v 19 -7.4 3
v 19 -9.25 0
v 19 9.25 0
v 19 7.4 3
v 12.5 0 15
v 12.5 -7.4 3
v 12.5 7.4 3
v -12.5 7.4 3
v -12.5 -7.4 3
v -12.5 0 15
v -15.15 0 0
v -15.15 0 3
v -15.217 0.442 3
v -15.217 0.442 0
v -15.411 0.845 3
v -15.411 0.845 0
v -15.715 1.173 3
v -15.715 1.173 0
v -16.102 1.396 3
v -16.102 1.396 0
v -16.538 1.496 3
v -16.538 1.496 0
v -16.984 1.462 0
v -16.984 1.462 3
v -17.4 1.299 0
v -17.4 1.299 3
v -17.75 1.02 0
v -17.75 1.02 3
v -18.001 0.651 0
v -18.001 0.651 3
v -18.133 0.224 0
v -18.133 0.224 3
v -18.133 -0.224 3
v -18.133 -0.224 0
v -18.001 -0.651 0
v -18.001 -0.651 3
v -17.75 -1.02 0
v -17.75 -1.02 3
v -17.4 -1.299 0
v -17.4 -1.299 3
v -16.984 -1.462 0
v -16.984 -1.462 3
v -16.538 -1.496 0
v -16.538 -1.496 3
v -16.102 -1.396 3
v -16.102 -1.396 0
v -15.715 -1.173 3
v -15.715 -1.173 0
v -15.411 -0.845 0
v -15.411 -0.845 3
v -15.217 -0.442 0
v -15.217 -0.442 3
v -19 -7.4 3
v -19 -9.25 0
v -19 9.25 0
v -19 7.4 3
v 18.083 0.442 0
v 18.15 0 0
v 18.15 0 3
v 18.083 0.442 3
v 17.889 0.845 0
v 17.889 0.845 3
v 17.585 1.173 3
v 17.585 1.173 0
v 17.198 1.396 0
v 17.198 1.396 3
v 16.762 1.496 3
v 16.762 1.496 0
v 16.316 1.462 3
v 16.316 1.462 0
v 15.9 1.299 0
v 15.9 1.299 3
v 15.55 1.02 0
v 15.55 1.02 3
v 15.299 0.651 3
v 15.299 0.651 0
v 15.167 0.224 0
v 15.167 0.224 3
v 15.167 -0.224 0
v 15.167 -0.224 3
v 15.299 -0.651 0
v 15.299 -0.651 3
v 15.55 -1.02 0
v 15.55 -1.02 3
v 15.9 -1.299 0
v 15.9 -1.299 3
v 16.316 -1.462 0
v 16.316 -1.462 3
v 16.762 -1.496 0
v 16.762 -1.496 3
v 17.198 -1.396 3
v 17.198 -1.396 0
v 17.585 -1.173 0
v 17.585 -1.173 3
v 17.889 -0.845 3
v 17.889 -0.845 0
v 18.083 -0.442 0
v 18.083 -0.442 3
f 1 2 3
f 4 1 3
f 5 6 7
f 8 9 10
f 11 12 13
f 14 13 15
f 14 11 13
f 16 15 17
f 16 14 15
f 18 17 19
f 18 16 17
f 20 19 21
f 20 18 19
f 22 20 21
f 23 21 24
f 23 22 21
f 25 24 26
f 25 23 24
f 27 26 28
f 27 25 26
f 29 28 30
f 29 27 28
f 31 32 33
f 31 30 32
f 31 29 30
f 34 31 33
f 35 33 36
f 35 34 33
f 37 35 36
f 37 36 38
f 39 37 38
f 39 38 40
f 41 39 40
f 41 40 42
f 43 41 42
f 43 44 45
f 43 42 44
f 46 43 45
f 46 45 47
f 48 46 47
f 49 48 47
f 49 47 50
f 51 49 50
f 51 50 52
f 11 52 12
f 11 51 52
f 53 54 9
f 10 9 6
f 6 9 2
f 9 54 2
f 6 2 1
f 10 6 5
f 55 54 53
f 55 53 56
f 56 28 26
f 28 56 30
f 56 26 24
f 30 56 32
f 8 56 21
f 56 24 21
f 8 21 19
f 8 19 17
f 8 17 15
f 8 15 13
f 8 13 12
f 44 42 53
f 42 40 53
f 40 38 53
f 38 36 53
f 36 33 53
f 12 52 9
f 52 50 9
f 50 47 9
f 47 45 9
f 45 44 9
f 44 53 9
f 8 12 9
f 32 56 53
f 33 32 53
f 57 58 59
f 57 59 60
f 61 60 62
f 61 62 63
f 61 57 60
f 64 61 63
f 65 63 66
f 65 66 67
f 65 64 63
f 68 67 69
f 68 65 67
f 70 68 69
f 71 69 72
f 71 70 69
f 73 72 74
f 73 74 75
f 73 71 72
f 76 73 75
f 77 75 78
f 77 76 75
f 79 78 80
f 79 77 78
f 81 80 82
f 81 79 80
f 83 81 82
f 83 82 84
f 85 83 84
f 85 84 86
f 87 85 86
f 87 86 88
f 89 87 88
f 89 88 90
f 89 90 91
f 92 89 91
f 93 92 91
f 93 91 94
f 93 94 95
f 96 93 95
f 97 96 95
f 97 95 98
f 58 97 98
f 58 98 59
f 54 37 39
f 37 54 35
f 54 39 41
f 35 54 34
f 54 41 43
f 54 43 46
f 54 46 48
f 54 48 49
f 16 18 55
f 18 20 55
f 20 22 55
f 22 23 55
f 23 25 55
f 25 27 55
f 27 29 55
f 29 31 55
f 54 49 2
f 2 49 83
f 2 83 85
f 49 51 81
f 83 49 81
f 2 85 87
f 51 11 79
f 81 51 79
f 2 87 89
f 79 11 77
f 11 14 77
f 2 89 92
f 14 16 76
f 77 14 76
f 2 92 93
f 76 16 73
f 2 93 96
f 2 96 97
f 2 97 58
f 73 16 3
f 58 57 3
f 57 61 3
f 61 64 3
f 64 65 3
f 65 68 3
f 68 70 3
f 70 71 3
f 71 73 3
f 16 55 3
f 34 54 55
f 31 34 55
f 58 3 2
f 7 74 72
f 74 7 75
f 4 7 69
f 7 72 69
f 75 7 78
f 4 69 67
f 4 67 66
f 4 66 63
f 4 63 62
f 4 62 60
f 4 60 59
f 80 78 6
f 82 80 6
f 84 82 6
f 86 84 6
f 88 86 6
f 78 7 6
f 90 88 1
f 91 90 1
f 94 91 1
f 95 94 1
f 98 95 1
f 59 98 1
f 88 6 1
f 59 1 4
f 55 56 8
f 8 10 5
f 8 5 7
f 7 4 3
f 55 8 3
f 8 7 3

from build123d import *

# Parameters (mm, degrees)
F0_W          = 38
F0_H          = 18.5
F0_R          = 1.5
F1_DEPTH      = 15
F3_DEPTH      = 38.001
F4_W          = 16.5
F4_H          = 12
F5_DEPTH      = 25
F5_DEPTH_BACK = 25


with BuildPart() as f1:
    # F0 (on Top) → F1 (new body)
    with BuildSketch(Plane.XY):
        Rectangle(F0_W, F0_H)
        with Locations((-16.65, 0)):
            Circle(F0_R, mode=Mode.SUBTRACT)
        with Locations((16.65, 0)):
            Circle(F0_R, mode=Mode.SUBTRACT)
    extrude(amount=F1_DEPTH)

    # F2 (on face) → F3 (cut, through all)
    with BuildSketch(Plane.YZ.offset(19)):
        Polygon((-9.25, 15), (-9.25, 0), (0, 15), align=None)
        Polygon((9.25, 15), (0, 15), (9.25, 0), align=None)
    extrude(amount=-F3_DEPTH, mode=Mode.SUBTRACT)

    # F4 (on Front) → F5 (cut, two sides)
    with BuildSketch(Plane.XZ) as f5_sk:
        with Locations((-20.75, 9)):
            Rectangle(F4_W, F4_H)
        with Locations((20.75, 9)):
            Rectangle(F4_W, F4_H)
    extrude(amount=F5_DEPTH, mode=Mode.SUBTRACT)
    extrude(f5_sk.sketch, amount=-F5_DEPTH_BACK, mode=Mode.SUBTRACT)


solid = f1.part
